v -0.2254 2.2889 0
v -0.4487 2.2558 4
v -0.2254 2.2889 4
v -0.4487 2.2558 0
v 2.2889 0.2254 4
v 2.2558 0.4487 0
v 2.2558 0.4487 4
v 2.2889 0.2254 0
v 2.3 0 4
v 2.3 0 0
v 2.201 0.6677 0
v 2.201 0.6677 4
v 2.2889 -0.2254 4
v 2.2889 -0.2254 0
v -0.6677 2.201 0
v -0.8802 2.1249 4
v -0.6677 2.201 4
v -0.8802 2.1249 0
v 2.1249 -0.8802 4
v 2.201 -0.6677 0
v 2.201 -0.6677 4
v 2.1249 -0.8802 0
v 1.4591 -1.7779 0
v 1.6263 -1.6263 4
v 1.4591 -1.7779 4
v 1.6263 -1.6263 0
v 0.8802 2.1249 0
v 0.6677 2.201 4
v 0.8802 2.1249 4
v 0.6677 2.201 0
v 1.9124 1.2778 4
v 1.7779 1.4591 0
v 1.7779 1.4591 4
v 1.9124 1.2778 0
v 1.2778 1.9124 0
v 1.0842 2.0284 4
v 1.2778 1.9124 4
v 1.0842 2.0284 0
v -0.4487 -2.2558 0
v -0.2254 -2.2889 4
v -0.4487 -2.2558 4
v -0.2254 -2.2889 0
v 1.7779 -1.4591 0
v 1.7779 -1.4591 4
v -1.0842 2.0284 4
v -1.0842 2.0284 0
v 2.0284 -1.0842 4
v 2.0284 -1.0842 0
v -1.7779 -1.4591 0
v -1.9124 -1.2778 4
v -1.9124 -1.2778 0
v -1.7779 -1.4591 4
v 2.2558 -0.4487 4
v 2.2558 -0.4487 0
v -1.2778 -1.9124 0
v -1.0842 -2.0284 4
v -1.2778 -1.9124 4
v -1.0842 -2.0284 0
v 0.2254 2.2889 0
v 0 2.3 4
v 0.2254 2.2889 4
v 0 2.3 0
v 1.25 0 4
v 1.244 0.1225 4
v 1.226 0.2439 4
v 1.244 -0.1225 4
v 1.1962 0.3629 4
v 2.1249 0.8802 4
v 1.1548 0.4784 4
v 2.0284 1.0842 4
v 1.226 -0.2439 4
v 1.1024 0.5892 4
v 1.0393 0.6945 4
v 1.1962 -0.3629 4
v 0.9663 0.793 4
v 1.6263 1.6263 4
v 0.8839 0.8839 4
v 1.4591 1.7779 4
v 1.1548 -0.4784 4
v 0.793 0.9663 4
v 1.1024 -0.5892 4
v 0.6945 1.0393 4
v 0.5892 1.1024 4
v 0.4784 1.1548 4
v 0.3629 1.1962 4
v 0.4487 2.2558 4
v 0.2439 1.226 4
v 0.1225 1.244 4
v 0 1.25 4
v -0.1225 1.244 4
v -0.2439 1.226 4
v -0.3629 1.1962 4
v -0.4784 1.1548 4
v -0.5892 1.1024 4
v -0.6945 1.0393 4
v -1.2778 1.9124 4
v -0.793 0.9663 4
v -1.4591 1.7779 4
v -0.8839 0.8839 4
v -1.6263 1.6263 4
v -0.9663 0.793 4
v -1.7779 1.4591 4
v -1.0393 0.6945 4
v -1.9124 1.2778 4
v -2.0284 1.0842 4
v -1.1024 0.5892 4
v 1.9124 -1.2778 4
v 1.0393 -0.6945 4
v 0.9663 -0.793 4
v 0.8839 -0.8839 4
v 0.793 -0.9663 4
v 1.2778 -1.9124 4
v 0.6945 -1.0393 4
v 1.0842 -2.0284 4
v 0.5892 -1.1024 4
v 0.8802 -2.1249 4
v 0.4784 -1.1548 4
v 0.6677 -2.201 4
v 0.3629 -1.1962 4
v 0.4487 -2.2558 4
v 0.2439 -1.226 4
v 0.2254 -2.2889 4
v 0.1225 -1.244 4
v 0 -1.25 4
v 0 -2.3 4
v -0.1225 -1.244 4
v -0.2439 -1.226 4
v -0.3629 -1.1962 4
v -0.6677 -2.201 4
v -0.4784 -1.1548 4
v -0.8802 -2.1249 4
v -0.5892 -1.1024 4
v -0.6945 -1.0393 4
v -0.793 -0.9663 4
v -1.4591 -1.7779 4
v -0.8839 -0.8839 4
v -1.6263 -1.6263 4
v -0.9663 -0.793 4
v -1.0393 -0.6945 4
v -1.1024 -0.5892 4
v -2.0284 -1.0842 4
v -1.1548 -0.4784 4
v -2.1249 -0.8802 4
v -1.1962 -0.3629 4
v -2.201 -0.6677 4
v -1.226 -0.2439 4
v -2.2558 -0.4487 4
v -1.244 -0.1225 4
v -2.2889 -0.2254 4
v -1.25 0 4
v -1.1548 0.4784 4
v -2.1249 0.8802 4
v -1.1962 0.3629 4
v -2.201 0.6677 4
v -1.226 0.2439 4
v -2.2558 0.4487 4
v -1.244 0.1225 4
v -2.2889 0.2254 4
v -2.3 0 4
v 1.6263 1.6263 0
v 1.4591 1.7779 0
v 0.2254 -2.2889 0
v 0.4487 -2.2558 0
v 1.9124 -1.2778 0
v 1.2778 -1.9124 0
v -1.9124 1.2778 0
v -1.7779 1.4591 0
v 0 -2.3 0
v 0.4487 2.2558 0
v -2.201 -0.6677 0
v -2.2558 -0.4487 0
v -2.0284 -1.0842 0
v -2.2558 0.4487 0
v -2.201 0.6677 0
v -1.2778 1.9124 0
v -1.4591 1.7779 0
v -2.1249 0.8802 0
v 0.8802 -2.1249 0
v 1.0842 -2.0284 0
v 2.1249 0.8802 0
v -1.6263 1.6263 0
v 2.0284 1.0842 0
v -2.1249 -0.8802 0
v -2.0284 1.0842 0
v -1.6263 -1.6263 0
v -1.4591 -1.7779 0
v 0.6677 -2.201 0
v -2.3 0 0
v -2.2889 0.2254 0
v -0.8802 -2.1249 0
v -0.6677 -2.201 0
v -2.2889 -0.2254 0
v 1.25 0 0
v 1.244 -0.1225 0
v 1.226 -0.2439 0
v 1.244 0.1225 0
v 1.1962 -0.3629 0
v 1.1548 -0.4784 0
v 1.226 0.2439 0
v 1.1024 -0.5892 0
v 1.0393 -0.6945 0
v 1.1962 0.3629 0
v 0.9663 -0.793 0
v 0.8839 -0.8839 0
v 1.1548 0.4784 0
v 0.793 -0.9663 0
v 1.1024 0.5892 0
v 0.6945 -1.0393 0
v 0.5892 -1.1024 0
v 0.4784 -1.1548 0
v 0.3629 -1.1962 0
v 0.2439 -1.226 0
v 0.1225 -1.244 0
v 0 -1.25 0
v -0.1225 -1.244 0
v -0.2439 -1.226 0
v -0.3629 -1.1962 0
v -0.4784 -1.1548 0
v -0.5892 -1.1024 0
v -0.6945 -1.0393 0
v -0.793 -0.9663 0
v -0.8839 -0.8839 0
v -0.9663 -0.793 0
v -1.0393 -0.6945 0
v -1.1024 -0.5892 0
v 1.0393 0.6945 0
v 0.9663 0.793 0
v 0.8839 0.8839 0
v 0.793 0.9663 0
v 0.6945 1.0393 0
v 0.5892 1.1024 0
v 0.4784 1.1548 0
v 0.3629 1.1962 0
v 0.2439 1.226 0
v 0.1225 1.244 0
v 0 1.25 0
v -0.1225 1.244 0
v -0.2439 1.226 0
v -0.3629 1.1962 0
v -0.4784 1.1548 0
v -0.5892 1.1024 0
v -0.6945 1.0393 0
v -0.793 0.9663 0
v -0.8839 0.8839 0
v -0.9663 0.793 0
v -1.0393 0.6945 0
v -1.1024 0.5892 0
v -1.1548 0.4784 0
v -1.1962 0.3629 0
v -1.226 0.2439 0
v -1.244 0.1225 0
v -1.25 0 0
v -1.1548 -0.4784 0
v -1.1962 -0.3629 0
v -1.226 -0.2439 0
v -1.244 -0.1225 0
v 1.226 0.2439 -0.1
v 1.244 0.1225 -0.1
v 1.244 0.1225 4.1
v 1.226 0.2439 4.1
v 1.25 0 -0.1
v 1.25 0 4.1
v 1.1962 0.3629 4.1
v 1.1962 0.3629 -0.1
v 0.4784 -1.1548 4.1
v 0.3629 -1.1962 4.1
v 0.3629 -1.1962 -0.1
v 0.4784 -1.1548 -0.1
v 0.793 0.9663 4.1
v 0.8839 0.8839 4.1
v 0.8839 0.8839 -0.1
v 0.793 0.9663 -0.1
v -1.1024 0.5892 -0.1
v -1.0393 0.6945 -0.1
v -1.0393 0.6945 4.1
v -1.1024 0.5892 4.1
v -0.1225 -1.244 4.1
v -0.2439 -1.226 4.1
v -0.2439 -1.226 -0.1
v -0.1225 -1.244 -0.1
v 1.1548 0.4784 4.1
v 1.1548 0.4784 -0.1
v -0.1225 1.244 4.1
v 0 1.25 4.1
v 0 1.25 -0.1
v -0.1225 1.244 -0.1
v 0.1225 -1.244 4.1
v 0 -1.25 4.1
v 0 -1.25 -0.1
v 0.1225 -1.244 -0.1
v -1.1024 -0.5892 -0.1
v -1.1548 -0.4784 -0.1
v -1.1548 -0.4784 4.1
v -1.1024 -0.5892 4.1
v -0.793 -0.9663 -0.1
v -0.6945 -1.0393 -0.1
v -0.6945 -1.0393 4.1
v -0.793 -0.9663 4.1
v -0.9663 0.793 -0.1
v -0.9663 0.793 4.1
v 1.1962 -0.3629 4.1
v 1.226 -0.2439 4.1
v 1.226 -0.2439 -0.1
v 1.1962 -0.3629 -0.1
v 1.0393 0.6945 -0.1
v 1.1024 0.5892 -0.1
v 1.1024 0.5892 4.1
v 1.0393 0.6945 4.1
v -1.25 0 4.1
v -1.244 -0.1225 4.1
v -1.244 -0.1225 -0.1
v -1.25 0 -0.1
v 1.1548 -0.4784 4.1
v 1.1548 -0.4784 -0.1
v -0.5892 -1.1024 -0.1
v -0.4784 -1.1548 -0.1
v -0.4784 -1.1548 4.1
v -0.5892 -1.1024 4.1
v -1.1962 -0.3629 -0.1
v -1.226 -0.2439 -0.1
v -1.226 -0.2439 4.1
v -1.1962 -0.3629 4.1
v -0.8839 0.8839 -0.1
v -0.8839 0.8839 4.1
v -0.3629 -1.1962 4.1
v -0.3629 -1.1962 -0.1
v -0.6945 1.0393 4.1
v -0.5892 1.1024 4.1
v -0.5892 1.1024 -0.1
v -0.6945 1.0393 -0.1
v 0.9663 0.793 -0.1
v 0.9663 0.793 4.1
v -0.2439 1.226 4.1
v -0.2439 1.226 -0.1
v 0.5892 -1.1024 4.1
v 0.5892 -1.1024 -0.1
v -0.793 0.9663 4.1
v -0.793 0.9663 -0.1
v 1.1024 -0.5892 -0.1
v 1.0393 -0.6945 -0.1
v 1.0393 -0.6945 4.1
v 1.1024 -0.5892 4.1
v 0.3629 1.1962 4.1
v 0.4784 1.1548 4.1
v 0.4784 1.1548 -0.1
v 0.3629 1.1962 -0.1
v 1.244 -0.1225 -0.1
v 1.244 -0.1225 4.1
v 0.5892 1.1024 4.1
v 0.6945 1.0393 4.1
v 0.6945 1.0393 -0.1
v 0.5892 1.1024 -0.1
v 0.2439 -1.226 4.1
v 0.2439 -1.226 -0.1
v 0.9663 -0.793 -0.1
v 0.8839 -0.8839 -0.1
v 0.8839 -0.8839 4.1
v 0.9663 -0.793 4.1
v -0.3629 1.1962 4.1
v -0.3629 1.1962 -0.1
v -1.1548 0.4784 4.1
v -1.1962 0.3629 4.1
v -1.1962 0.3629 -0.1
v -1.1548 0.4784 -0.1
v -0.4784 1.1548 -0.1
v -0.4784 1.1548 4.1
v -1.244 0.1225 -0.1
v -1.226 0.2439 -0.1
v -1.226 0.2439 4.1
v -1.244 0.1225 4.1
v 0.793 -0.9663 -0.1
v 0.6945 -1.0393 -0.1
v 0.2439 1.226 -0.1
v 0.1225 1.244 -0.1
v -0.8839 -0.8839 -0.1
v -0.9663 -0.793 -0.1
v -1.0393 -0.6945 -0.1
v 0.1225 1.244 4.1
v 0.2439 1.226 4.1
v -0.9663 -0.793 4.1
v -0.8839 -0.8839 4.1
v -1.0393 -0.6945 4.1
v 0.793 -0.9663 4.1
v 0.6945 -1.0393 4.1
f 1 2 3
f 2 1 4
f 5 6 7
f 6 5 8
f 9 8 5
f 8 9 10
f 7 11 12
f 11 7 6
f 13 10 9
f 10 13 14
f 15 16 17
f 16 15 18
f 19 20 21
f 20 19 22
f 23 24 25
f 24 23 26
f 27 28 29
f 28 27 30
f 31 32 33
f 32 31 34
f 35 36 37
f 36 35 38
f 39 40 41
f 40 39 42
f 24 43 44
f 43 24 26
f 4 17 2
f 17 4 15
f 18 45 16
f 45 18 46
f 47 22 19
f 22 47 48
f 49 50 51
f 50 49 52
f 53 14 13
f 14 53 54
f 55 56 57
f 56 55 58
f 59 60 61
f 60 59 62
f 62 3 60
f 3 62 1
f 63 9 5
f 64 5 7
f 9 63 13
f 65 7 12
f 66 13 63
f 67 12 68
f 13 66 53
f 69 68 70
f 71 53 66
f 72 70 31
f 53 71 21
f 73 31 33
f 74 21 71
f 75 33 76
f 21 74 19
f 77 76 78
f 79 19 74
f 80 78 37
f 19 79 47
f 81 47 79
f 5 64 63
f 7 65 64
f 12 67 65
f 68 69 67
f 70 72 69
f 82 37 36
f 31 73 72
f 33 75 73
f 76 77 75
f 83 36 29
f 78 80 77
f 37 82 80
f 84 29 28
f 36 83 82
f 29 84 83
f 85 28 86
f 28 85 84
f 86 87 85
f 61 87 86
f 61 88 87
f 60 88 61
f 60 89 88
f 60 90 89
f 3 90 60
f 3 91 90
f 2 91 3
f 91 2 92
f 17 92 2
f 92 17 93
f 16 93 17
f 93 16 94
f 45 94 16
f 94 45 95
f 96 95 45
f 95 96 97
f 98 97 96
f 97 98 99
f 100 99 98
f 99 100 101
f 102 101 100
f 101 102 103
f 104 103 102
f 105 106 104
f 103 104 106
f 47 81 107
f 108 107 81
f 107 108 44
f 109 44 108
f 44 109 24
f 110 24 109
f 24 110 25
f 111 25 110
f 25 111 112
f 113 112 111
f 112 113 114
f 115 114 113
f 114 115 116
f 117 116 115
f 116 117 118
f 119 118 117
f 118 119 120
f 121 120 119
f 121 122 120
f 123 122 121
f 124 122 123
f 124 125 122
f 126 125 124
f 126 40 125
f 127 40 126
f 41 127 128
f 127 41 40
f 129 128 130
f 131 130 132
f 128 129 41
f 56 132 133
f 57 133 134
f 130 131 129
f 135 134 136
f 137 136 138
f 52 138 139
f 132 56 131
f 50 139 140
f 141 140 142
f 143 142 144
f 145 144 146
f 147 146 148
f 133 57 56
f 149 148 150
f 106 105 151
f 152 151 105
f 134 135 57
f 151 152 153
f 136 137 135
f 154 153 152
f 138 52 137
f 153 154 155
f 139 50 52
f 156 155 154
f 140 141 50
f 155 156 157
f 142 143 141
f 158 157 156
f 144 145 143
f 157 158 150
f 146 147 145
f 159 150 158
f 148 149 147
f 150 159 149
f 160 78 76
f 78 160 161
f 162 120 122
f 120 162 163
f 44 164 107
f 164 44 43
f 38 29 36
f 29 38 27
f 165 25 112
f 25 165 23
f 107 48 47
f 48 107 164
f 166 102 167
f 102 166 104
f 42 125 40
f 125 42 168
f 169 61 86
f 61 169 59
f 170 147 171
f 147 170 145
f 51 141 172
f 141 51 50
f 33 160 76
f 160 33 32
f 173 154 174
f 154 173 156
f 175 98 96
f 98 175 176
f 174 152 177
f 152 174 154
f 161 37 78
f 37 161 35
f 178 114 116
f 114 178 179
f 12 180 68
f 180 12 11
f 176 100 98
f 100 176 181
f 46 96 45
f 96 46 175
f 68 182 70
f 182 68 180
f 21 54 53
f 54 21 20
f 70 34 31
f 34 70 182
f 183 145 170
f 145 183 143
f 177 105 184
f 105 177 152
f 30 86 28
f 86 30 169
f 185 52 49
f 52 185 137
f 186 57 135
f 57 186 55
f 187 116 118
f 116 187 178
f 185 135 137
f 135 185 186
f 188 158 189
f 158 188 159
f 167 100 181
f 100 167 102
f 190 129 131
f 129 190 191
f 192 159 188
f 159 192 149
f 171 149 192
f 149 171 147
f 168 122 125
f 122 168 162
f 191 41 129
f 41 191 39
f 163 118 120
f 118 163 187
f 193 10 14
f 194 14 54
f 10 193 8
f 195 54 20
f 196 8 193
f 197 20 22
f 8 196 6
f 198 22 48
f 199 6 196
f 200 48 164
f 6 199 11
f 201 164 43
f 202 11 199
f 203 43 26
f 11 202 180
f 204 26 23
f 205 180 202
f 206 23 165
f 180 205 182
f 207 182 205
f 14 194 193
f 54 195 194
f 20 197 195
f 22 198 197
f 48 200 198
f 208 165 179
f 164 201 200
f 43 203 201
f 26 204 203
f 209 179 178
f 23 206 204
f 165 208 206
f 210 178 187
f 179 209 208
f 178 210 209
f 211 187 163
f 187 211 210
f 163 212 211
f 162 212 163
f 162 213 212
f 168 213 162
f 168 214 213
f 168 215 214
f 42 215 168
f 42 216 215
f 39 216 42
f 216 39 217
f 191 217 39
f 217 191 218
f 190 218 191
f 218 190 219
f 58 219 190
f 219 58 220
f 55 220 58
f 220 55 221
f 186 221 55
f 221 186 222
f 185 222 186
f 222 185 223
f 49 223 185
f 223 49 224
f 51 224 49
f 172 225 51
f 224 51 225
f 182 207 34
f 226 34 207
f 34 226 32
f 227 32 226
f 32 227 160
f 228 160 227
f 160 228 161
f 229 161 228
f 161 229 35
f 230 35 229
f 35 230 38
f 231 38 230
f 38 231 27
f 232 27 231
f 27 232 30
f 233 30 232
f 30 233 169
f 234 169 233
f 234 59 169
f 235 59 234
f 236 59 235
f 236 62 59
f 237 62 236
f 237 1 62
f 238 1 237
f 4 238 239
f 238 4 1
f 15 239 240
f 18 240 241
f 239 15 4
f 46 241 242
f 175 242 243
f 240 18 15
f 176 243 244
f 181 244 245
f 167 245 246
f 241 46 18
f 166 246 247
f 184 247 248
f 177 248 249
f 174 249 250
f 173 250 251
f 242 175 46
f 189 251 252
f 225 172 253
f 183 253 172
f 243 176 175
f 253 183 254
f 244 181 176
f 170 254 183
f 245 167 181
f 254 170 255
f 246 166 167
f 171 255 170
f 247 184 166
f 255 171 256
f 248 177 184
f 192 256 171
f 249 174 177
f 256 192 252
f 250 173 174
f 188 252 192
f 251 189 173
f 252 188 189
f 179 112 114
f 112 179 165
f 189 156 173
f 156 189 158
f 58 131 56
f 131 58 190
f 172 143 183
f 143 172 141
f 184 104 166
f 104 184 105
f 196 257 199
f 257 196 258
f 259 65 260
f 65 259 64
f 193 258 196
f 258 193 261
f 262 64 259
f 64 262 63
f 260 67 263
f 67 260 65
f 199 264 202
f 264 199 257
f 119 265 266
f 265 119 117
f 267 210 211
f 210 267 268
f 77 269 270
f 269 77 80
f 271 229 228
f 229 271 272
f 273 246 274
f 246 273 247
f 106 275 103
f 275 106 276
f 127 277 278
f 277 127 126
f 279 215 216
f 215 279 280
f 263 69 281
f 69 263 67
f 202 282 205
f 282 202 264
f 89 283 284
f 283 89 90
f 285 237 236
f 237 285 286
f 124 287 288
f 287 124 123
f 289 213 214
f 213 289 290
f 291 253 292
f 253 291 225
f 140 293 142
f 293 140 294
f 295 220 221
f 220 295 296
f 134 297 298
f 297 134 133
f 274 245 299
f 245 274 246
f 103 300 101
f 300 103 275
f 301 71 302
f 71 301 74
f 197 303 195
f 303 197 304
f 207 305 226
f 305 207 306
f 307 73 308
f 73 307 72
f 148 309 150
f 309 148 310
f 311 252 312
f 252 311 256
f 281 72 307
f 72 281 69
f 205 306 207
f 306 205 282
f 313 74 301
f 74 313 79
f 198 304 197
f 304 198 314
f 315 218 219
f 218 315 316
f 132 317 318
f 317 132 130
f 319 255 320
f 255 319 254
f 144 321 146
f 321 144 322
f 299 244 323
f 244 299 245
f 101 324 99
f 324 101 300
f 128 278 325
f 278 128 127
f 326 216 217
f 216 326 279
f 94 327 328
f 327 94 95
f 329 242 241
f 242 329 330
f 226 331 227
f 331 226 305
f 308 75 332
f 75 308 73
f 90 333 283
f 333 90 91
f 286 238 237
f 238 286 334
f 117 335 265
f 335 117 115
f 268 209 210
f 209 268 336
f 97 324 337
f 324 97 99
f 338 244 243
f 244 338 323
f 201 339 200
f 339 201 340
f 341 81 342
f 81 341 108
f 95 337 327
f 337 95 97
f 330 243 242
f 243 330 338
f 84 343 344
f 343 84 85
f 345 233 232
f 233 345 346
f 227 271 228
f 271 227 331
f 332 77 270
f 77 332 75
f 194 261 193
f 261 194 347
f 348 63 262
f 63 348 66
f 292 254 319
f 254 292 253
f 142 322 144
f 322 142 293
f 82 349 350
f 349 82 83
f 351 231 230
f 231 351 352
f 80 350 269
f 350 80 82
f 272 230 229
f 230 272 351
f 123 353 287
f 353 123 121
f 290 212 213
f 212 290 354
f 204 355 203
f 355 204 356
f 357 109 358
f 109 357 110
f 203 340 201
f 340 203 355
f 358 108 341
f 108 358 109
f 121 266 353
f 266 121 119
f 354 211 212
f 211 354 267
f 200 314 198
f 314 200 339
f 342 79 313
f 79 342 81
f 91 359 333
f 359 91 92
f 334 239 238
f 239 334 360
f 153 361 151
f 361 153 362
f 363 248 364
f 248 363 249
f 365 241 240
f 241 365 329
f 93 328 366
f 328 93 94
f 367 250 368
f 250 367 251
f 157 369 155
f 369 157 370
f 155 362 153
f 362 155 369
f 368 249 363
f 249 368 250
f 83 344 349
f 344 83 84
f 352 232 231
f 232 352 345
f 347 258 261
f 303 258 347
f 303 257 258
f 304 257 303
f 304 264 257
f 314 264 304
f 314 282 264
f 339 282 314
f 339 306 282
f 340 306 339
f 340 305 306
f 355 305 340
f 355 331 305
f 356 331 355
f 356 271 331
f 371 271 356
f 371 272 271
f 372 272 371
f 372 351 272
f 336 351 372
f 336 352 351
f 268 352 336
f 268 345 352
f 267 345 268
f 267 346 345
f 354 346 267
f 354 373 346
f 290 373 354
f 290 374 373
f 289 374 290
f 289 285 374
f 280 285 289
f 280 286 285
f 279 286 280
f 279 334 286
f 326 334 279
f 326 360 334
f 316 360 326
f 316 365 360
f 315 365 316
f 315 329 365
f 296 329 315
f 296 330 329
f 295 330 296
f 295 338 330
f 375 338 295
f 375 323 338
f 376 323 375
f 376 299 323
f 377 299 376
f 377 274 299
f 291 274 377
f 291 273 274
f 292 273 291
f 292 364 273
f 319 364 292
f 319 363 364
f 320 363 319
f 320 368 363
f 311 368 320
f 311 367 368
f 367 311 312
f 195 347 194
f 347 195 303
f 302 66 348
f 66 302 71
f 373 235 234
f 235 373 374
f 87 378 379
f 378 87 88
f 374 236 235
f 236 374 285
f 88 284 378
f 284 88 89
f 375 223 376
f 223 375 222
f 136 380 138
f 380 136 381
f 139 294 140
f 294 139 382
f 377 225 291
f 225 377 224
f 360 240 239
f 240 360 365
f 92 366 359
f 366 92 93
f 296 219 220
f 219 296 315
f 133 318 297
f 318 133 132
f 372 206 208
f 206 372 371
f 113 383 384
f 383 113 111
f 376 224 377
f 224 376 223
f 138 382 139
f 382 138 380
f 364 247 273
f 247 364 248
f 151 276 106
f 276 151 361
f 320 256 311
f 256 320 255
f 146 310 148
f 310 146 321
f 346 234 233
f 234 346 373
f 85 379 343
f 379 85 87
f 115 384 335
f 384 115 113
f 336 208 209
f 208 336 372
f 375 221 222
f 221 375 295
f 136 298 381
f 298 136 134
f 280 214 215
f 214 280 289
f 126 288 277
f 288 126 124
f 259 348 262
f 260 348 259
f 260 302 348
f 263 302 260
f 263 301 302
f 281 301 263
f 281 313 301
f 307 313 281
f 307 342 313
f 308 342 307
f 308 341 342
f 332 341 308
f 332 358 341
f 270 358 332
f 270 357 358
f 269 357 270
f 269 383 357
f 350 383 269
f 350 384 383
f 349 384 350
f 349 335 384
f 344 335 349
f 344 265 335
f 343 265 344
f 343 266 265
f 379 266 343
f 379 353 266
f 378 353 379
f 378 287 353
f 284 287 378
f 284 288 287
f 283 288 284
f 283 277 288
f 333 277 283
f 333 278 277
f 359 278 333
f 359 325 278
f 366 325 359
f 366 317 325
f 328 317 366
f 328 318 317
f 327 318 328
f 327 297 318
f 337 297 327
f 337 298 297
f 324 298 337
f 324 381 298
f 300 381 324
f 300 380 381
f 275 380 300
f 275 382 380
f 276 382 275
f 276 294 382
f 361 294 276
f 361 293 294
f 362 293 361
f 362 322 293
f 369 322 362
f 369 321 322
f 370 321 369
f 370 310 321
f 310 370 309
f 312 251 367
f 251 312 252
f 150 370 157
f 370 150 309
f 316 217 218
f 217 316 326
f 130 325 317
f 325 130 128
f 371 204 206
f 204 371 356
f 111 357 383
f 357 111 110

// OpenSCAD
cylinder(h=4, d=4.6, $fn=64);  
translate([0, 0, -0.1])  
cylinder(h=4.2, d=2.5, $fn=64);
